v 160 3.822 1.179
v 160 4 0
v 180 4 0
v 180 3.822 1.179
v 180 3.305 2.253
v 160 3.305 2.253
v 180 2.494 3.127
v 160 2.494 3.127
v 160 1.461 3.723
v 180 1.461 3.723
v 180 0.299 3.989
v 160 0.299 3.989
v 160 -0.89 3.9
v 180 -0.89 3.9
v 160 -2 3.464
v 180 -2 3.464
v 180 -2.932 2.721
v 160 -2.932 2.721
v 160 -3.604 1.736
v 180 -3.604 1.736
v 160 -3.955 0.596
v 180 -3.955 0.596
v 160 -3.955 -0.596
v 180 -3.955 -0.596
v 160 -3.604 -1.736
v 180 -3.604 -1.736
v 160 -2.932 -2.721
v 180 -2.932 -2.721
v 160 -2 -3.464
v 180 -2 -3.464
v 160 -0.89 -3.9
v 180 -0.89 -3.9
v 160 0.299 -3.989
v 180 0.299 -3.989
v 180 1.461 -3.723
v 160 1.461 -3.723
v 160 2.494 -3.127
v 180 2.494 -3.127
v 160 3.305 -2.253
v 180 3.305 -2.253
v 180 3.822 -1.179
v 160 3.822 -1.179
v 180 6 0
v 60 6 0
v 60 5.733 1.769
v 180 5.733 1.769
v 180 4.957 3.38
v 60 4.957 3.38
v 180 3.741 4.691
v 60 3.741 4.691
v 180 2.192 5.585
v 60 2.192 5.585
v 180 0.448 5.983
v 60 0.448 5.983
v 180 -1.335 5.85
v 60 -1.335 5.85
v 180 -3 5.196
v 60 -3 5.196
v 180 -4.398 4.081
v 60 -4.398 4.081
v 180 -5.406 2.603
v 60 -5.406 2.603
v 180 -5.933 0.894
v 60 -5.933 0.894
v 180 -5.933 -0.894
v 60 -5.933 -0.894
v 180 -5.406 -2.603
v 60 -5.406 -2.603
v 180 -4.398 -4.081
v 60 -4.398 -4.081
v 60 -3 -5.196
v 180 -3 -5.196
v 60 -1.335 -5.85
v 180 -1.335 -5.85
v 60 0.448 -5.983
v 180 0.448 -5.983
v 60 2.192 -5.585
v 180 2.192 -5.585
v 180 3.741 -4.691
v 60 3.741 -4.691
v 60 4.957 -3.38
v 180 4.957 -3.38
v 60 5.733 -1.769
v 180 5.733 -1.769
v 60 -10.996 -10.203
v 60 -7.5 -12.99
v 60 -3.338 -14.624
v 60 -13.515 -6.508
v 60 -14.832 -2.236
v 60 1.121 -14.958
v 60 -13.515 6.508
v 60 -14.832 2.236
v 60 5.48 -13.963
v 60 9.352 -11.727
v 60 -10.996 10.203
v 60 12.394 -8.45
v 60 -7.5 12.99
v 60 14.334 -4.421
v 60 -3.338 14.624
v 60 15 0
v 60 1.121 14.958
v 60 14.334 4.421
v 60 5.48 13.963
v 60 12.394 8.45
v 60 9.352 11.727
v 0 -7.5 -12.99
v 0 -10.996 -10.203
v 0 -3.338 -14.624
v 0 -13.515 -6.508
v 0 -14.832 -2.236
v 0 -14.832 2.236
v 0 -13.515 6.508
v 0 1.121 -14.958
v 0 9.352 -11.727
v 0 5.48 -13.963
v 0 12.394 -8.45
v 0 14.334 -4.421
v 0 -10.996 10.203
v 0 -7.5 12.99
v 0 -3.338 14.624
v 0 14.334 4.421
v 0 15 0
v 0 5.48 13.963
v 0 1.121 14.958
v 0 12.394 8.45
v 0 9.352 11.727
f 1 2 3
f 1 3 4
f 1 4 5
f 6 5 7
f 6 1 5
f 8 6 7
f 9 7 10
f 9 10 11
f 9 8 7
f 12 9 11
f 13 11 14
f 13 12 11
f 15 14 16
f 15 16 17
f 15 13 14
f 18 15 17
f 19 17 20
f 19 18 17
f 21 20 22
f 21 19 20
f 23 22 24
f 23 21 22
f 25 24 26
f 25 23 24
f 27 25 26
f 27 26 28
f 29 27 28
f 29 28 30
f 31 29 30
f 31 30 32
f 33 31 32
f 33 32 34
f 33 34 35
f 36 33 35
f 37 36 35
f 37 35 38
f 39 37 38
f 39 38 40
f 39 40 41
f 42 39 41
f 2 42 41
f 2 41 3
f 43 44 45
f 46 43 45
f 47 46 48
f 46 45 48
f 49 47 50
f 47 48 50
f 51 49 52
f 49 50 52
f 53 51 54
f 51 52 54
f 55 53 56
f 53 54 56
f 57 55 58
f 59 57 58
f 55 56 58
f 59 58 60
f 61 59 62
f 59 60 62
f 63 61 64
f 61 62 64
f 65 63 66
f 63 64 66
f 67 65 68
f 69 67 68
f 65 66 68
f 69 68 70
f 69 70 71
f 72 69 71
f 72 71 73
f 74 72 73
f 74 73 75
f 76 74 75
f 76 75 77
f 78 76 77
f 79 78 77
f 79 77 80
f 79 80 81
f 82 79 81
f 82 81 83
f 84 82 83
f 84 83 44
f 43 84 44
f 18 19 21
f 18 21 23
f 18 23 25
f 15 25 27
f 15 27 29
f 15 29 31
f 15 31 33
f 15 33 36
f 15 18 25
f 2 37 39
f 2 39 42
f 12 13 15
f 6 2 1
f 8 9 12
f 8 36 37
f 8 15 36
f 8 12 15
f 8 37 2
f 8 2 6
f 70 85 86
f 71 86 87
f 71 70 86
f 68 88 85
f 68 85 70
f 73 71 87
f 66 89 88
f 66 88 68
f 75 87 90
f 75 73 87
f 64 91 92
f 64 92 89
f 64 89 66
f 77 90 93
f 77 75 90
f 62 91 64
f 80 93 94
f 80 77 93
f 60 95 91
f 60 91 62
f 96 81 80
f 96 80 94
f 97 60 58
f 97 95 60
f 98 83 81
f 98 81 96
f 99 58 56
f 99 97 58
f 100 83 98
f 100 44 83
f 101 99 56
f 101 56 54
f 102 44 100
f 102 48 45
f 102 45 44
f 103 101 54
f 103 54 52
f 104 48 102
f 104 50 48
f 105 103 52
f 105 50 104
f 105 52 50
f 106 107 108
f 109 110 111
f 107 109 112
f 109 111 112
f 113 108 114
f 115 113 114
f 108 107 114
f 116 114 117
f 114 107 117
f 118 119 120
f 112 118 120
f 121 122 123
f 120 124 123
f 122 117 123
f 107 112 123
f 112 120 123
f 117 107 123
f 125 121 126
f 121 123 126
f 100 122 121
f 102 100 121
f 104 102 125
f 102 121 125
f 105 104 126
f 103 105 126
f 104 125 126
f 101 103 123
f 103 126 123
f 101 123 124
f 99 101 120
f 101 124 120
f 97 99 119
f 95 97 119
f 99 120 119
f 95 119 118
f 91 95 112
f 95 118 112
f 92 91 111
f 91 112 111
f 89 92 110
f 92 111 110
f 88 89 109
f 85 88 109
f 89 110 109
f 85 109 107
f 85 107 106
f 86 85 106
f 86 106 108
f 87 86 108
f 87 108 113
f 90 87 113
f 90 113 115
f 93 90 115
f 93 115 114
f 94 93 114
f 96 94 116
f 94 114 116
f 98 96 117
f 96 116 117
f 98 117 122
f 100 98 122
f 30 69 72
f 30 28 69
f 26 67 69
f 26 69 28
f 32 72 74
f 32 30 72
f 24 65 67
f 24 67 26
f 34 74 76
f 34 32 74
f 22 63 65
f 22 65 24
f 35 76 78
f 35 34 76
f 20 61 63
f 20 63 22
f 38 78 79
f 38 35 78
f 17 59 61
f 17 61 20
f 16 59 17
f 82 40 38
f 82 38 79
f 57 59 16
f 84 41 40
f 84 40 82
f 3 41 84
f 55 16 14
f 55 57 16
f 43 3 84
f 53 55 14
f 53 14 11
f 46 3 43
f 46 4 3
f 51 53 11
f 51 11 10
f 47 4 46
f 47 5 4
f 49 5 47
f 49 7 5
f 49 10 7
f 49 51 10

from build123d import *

# Parameters (mm, degrees)
F0_R     = 15
F0_R_2   = 6
F0_R_3   = 4
F1_DEPTH = 60
F2_DEPTH = 180
F3_DEPTH = 160


with BuildPart() as f1:
    # F0 (on Right) → F1 (new body)
    with BuildSketch(Plane.YZ):
        Circle(F0_R)
        Circle(F0_R_2, mode=Mode.SUBTRACT)
        Circle(F0_R_2)
        Circle(F0_R_3, mode=Mode.SUBTRACT)
        Circle(F0_R_3)
    extrude(amount=F1_DEPTH)

    # F0 (on Right) → F2 (join)
    with BuildSketch(Plane.YZ):
        Circle(F0_R_2)
        Circle(F0_R_3, mode=Mode.SUBTRACT)
    extrude(amount=F2_DEPTH)

    # F0 (on Right) → F3 (join)
    with BuildSketch(Plane.YZ):
        Circle(F0_R_3)
    extrude(amount=F3_DEPTH)


solid = f1.part
